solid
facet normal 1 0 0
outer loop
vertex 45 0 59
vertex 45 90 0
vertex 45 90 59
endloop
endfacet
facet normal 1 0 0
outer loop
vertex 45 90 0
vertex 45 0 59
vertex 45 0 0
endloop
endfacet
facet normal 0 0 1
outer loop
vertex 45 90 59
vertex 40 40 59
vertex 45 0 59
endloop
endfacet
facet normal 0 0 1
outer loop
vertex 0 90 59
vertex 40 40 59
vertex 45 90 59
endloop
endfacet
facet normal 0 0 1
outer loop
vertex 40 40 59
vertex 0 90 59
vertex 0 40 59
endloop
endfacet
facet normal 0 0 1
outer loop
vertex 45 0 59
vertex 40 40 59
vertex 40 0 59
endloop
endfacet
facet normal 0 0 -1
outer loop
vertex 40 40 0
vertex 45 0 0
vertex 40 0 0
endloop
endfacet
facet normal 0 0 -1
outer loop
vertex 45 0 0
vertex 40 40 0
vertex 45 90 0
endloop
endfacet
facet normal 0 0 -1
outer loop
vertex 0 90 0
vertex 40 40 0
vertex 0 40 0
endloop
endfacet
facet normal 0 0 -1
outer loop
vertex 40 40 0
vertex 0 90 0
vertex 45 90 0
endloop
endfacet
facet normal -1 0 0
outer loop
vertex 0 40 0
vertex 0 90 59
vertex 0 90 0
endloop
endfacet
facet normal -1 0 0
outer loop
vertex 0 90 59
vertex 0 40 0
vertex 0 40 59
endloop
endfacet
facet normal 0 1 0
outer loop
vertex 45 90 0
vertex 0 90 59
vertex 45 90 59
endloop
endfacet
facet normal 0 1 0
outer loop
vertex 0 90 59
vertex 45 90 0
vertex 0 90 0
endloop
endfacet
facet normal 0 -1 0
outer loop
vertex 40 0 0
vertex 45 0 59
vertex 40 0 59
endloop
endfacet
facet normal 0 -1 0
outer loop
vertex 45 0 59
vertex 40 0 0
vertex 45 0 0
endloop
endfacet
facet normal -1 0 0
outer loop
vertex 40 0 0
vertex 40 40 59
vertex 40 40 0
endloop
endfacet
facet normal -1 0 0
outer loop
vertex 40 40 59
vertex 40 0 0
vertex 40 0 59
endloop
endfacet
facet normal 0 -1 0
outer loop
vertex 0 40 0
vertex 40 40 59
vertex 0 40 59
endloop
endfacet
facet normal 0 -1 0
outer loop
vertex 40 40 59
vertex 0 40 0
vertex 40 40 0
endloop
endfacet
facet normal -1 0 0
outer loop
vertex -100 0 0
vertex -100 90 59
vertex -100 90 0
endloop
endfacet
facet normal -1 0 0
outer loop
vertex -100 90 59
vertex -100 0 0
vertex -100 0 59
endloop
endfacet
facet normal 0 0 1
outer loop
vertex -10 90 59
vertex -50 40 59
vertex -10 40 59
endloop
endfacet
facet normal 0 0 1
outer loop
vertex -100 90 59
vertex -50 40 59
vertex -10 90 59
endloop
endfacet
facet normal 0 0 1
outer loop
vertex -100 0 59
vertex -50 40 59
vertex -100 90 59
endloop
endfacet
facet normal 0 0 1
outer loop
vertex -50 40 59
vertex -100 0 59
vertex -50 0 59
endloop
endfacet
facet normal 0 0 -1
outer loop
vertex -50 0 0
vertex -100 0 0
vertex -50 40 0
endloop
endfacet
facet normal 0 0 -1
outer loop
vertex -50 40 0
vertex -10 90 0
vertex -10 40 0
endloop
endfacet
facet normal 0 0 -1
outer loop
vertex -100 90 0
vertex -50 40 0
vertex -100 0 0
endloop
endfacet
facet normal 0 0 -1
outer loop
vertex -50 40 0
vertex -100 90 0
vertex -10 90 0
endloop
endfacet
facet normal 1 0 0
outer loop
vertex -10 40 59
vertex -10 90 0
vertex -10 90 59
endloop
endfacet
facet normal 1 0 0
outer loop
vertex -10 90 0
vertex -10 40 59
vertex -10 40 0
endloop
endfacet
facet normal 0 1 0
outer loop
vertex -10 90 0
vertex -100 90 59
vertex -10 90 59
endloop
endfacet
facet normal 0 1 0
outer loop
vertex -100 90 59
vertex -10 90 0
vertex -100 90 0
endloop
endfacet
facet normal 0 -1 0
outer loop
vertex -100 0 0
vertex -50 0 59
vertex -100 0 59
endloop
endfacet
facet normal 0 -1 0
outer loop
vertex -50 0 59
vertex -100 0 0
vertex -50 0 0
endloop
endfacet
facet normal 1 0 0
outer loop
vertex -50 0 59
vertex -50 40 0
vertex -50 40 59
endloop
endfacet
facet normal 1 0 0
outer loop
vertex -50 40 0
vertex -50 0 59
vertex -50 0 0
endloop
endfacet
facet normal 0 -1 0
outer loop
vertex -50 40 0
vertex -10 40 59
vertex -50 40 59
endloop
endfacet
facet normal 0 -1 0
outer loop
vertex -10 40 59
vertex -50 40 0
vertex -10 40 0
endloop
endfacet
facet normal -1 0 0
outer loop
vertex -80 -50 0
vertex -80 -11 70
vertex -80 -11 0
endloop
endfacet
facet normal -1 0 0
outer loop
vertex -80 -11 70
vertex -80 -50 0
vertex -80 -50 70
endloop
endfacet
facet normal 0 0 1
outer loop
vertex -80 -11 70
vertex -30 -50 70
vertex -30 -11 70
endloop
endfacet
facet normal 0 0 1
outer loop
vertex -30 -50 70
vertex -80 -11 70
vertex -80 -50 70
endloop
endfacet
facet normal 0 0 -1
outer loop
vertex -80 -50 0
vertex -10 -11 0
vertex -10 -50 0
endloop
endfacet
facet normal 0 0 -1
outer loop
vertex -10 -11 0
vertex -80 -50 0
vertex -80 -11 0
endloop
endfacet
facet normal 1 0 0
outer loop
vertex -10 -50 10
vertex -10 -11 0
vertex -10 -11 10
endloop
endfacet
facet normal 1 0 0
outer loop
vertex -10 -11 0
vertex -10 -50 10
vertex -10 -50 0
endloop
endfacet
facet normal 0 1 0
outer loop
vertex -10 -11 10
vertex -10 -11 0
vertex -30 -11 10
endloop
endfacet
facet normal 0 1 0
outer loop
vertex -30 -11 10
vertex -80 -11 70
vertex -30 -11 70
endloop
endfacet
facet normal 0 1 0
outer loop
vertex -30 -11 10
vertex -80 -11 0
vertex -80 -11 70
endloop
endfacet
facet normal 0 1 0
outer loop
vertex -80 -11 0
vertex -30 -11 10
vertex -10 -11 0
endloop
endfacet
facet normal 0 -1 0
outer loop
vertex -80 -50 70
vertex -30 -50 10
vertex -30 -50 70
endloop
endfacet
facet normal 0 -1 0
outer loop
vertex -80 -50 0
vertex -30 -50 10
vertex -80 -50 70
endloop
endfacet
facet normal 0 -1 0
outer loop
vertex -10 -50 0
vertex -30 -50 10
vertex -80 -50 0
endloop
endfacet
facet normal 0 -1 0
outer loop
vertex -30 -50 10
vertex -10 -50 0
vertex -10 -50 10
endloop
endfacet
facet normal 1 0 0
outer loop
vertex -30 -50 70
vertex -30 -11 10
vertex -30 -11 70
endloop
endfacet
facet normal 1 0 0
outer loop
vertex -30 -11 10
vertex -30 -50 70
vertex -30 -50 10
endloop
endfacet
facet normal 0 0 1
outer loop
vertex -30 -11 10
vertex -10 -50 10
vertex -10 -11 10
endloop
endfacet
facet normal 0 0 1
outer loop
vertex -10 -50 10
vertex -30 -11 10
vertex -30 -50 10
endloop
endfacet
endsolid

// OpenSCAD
module Spacer(fridge, space)
{
  difference()
  {
    cube(fridge + space);

    translate([-1, -1, space[2]])
    {
      cube(fridge + [1, 1, 1]);
    }
  }
}


fridge_1 = [40, 40, 60];
fridge_2 = [20, 40, 60];


Spacer(fridge_1, [5, 50, -1]);

mirror([1, 0, 0])
{
  translate([10, 0, 0])
  {
    Spacer(fridge_1, [50, 50, -1]);
  }

  translate([10, -50, 0])
  {
    Spacer(fridge_2, [50, -1, 10]);
  }
}
